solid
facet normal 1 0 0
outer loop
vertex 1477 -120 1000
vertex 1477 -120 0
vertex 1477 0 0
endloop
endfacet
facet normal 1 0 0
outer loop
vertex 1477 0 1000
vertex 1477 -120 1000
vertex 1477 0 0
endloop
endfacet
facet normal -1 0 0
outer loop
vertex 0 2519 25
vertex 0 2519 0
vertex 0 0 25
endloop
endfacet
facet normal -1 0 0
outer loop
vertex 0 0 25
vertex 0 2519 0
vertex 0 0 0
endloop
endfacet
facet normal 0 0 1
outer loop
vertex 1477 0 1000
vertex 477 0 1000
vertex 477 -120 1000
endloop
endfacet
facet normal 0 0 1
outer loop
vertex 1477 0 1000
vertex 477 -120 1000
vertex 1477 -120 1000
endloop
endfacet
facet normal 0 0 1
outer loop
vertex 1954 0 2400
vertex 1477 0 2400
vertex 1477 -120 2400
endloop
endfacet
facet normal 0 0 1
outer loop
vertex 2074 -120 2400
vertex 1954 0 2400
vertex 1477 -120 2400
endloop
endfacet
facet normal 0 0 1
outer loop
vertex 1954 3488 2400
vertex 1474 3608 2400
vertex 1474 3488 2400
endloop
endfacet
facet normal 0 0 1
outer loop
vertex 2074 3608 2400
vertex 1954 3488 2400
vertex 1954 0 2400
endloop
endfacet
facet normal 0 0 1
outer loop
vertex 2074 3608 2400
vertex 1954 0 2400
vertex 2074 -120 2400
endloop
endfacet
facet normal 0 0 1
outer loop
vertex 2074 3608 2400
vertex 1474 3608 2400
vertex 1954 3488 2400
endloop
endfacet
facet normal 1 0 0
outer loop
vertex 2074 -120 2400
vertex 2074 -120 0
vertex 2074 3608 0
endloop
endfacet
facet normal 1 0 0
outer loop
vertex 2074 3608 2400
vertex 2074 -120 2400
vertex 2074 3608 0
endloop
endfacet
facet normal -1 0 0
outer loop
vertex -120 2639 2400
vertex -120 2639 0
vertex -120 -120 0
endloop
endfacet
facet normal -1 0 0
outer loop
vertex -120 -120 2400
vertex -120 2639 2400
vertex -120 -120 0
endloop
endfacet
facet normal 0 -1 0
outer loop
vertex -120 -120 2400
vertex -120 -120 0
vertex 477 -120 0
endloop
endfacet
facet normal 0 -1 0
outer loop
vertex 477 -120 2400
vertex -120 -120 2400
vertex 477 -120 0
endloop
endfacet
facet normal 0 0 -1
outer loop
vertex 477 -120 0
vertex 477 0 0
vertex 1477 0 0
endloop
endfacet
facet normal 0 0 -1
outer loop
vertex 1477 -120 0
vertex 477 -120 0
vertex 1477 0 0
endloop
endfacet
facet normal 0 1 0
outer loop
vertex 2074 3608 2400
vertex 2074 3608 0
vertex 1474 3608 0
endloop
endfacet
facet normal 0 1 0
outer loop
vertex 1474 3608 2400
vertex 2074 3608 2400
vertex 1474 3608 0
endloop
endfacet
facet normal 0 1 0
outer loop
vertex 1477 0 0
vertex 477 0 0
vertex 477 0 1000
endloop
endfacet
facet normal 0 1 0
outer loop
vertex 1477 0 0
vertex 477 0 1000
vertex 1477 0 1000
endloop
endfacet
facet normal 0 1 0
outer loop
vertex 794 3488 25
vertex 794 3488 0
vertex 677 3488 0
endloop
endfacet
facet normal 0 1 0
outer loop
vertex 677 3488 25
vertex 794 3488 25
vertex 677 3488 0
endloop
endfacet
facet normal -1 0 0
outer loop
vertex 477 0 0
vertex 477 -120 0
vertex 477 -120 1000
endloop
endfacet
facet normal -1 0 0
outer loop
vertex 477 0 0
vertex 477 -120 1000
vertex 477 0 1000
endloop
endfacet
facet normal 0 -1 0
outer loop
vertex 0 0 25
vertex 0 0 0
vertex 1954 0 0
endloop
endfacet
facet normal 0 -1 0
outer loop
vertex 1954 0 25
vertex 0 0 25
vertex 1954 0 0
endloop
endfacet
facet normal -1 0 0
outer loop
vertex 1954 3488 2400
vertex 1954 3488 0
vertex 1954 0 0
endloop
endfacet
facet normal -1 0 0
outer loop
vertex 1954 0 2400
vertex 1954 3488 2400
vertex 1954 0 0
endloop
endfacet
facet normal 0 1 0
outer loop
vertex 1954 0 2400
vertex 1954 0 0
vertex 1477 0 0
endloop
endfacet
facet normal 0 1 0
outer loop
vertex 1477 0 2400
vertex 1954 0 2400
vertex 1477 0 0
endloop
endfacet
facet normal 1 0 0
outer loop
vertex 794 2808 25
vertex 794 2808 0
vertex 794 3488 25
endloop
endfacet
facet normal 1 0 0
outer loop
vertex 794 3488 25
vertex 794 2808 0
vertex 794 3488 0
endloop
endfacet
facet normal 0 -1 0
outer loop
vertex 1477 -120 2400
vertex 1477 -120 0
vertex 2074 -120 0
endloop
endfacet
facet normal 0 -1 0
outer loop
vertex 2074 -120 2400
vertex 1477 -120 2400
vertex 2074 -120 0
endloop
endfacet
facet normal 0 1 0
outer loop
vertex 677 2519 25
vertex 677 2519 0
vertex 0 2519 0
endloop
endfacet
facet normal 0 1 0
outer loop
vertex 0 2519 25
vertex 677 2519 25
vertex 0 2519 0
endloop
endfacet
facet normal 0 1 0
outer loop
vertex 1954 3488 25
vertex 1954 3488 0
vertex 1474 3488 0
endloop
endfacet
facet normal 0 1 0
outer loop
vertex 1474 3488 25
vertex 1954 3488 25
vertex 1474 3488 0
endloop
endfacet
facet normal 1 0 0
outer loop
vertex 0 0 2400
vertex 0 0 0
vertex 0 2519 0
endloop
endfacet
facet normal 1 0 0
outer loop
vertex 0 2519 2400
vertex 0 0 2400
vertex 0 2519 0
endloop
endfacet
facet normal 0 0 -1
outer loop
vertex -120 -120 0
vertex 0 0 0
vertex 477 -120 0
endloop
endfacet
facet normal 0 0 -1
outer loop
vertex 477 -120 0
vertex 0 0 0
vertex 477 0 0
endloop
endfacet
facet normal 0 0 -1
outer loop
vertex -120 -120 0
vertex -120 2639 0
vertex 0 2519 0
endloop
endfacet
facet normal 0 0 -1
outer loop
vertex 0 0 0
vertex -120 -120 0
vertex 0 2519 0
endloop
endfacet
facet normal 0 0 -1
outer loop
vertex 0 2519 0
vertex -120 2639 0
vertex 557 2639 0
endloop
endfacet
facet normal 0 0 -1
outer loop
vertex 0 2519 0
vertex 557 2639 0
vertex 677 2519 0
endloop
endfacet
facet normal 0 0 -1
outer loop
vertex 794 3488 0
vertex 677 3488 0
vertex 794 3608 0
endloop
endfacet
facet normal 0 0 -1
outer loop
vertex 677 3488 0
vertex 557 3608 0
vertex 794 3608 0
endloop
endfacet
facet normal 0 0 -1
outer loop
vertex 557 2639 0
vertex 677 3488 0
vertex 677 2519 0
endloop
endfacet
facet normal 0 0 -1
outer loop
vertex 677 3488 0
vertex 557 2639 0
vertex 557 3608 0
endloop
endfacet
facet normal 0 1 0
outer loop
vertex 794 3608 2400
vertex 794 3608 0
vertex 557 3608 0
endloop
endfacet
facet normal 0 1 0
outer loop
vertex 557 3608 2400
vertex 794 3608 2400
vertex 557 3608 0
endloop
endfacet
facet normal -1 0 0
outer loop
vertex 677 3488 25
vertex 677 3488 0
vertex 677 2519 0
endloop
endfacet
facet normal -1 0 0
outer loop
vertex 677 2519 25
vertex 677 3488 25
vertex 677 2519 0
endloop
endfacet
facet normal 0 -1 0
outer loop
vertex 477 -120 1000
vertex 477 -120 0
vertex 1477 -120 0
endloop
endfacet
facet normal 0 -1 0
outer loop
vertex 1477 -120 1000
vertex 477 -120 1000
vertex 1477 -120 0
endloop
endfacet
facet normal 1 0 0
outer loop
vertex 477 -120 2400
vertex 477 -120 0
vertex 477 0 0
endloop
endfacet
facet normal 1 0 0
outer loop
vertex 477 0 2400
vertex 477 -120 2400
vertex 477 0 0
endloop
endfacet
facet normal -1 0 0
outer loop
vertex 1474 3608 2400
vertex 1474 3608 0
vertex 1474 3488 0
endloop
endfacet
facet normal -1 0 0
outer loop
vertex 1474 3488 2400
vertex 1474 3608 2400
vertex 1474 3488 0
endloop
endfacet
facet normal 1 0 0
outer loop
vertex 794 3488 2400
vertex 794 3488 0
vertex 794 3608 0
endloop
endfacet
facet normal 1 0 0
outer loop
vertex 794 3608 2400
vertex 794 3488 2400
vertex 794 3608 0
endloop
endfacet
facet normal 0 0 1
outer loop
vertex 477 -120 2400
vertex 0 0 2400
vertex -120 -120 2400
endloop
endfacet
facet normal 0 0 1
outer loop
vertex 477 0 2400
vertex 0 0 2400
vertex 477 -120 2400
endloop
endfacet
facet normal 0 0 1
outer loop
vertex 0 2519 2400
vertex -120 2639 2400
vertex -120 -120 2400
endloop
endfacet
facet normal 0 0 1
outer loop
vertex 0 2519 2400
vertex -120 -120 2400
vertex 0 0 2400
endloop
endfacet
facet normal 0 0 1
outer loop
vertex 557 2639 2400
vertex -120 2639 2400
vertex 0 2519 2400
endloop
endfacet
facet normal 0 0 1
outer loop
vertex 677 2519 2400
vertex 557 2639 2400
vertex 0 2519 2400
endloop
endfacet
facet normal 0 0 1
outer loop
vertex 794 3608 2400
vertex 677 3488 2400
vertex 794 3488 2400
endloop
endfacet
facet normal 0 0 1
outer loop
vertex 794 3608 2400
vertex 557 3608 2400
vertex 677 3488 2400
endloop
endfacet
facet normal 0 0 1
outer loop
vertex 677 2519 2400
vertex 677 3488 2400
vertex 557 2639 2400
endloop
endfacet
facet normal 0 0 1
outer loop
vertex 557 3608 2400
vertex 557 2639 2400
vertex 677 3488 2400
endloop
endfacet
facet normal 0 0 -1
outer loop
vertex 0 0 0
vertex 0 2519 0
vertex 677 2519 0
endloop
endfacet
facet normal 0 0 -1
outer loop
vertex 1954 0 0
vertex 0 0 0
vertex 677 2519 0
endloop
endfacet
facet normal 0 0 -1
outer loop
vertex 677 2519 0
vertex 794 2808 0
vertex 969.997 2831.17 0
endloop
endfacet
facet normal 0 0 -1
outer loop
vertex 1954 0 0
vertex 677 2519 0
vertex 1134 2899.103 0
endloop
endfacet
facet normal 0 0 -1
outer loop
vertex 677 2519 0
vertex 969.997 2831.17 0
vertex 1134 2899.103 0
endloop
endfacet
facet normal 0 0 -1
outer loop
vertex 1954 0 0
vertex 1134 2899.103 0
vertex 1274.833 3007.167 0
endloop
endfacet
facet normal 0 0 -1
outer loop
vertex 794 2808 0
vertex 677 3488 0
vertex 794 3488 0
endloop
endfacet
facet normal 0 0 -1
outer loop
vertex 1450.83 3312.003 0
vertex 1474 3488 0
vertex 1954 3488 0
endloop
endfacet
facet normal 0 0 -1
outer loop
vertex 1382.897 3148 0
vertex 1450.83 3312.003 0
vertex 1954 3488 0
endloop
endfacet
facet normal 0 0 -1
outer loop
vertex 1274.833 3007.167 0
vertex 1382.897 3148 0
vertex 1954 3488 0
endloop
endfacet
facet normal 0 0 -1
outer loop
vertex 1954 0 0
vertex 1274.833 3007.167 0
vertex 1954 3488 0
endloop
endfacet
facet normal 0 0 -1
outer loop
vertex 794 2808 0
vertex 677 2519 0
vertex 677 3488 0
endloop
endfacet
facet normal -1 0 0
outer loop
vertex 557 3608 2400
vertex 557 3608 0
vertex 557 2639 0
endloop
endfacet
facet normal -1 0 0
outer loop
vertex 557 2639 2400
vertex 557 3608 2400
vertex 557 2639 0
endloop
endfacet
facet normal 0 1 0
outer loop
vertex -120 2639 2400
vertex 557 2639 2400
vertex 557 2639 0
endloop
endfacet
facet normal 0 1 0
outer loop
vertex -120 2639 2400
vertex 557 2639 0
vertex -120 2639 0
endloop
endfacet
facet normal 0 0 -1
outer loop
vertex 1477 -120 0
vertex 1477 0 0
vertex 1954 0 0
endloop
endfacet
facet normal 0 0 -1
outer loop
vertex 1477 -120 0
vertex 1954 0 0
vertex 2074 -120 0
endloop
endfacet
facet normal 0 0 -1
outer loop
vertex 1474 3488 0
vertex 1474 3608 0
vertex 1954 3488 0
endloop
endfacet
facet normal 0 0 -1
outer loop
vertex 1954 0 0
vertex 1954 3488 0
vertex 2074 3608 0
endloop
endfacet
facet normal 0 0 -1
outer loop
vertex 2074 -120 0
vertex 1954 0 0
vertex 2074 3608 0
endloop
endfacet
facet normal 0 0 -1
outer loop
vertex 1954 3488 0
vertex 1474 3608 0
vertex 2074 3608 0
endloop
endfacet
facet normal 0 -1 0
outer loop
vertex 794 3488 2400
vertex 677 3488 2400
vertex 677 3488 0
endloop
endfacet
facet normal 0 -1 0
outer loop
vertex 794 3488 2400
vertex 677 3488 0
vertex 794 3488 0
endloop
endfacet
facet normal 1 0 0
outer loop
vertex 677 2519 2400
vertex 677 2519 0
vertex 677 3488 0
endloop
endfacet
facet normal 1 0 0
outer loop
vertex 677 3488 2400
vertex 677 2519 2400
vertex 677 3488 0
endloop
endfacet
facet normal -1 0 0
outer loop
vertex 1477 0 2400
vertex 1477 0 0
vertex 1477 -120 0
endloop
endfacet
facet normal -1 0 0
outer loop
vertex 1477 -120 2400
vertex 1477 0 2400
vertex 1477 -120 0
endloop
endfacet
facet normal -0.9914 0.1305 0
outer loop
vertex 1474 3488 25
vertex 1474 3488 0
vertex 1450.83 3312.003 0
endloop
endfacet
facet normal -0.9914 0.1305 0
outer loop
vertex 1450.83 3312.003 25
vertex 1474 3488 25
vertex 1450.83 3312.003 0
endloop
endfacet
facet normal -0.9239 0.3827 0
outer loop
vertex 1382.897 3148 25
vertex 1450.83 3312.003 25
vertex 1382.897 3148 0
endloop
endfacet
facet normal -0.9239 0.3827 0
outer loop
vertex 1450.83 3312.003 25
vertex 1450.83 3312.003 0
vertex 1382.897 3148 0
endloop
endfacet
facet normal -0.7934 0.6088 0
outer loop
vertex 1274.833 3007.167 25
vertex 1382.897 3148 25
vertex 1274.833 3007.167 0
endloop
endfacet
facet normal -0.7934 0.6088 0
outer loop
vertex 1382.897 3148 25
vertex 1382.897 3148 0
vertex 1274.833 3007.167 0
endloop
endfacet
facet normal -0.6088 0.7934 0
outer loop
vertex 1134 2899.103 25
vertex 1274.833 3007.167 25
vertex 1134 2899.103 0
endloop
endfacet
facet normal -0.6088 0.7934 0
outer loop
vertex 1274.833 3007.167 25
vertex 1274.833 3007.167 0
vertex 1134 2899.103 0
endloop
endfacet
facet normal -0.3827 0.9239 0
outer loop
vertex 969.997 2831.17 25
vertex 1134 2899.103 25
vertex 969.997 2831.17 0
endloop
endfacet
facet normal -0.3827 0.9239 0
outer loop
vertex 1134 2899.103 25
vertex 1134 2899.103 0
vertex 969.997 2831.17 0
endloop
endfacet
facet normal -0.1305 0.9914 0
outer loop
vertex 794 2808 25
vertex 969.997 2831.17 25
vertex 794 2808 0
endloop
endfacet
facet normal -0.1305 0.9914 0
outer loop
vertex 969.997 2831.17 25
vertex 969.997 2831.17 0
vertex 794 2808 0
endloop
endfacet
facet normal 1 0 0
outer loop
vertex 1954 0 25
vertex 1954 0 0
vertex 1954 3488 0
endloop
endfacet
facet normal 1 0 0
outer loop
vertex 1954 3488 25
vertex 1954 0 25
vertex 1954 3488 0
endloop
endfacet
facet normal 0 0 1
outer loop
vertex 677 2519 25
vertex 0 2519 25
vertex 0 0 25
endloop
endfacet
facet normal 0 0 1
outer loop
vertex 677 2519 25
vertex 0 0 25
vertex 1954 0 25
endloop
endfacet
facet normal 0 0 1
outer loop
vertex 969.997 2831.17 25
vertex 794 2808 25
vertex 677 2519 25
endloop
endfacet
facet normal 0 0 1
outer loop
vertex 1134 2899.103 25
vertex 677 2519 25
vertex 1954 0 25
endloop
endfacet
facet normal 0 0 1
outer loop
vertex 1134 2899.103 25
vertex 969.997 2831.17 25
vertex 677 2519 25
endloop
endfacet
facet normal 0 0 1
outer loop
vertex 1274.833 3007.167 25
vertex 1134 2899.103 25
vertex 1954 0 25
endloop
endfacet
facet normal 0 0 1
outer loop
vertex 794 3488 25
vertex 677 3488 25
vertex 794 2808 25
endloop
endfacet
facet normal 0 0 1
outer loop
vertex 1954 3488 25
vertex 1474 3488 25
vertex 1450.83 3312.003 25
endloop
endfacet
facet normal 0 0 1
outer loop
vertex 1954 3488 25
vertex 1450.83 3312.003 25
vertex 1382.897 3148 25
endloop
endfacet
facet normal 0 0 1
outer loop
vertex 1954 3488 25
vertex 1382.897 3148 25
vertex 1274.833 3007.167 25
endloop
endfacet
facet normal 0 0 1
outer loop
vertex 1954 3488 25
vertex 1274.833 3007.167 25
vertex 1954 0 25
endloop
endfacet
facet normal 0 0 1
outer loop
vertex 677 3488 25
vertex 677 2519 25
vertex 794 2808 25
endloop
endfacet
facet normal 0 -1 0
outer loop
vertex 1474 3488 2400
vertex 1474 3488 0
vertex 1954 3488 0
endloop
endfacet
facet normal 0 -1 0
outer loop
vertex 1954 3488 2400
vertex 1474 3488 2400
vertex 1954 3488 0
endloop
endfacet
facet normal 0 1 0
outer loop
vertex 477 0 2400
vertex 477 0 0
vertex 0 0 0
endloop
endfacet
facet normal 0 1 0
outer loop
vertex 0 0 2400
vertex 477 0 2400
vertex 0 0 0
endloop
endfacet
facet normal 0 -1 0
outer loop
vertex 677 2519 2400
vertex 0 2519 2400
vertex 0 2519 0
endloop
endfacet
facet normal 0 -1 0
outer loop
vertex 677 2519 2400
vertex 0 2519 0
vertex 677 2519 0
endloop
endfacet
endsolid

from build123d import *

# Parameters (mm, degrees)
F1_DEPTH = 2400
F0_W     = 1000
F0_H     = 120
F2_DEPTH = 1000
F4_DEPTH = 25


# Not quite as in the source:
# - a feature of the source that left no trace in its solid (it failed there, or was rolled back) is left out


with BuildPart() as f1:
    # F0 (on Top) → F1 (new body)
    with BuildSketch(Plane.XY):
        Polygon((1954, 0), (1477, 0), (1477, -120), (2074, -120), (2074, 3608), (1474, 3608), (1474, 3488), (1954, 3488), align=None)
    extrude(amount=F1_DEPTH)


with BuildPart() as f1b:
    # F0 (on Top) → F1, piece 2 (new body)
    with BuildSketch(Plane.XY):
        Polygon((398.1228470802, 0), (0, 0), (0, 2519), (677, 2519), (677, 3488), (794, 3488), (794, 3608), (677, 3608), (557, 3608), (557, 2639), (-120, 2639), (-120, 2519), (-120, -120), (398.1228470802, -120), (477, -120), (477, 0), align=None)
    extrude(amount=F1_DEPTH)


with BuildPart() as f2:
    # F0 (on Top) → F2 (new body)
    with BuildSketch(Plane.XY):
        with Locations((977, -60)):
            Rectangle(F0_W, F0_H)
    extrude(amount=F2_DEPTH)


with BuildPart() as f4:
    # F0 (on Top) → F4 (new body)
    with BuildSketch(Plane.XY):
        with BuildLine():
            Line((0, 2519), (0, 0))
            Line((0, 0), (398.1228470802, 0))
            Line((398.1228470802, 0), (477, 0))
            Line((477, 0), (1477, 0))
            Line((1477, 0), (1954, 0))
            Line((1954, 0), (1954, 3488))
            Line((1954, 3488), (1474, 3488))
            ThreePointArc((1474, 3488), (1274.8326112069, 3007.1673887931), (794, 2808))
            Line((794, 2808), (794, 3488))
            Line((794, 3488), (677, 3488))
            Line((677, 3488), (677, 2519))
            Line((677, 2519), (0, 2519))
        make_face()
    extrude(amount=F4_DEPTH)


solid = Compound([f1.part, f1b.part, f2.part, f4.part])
